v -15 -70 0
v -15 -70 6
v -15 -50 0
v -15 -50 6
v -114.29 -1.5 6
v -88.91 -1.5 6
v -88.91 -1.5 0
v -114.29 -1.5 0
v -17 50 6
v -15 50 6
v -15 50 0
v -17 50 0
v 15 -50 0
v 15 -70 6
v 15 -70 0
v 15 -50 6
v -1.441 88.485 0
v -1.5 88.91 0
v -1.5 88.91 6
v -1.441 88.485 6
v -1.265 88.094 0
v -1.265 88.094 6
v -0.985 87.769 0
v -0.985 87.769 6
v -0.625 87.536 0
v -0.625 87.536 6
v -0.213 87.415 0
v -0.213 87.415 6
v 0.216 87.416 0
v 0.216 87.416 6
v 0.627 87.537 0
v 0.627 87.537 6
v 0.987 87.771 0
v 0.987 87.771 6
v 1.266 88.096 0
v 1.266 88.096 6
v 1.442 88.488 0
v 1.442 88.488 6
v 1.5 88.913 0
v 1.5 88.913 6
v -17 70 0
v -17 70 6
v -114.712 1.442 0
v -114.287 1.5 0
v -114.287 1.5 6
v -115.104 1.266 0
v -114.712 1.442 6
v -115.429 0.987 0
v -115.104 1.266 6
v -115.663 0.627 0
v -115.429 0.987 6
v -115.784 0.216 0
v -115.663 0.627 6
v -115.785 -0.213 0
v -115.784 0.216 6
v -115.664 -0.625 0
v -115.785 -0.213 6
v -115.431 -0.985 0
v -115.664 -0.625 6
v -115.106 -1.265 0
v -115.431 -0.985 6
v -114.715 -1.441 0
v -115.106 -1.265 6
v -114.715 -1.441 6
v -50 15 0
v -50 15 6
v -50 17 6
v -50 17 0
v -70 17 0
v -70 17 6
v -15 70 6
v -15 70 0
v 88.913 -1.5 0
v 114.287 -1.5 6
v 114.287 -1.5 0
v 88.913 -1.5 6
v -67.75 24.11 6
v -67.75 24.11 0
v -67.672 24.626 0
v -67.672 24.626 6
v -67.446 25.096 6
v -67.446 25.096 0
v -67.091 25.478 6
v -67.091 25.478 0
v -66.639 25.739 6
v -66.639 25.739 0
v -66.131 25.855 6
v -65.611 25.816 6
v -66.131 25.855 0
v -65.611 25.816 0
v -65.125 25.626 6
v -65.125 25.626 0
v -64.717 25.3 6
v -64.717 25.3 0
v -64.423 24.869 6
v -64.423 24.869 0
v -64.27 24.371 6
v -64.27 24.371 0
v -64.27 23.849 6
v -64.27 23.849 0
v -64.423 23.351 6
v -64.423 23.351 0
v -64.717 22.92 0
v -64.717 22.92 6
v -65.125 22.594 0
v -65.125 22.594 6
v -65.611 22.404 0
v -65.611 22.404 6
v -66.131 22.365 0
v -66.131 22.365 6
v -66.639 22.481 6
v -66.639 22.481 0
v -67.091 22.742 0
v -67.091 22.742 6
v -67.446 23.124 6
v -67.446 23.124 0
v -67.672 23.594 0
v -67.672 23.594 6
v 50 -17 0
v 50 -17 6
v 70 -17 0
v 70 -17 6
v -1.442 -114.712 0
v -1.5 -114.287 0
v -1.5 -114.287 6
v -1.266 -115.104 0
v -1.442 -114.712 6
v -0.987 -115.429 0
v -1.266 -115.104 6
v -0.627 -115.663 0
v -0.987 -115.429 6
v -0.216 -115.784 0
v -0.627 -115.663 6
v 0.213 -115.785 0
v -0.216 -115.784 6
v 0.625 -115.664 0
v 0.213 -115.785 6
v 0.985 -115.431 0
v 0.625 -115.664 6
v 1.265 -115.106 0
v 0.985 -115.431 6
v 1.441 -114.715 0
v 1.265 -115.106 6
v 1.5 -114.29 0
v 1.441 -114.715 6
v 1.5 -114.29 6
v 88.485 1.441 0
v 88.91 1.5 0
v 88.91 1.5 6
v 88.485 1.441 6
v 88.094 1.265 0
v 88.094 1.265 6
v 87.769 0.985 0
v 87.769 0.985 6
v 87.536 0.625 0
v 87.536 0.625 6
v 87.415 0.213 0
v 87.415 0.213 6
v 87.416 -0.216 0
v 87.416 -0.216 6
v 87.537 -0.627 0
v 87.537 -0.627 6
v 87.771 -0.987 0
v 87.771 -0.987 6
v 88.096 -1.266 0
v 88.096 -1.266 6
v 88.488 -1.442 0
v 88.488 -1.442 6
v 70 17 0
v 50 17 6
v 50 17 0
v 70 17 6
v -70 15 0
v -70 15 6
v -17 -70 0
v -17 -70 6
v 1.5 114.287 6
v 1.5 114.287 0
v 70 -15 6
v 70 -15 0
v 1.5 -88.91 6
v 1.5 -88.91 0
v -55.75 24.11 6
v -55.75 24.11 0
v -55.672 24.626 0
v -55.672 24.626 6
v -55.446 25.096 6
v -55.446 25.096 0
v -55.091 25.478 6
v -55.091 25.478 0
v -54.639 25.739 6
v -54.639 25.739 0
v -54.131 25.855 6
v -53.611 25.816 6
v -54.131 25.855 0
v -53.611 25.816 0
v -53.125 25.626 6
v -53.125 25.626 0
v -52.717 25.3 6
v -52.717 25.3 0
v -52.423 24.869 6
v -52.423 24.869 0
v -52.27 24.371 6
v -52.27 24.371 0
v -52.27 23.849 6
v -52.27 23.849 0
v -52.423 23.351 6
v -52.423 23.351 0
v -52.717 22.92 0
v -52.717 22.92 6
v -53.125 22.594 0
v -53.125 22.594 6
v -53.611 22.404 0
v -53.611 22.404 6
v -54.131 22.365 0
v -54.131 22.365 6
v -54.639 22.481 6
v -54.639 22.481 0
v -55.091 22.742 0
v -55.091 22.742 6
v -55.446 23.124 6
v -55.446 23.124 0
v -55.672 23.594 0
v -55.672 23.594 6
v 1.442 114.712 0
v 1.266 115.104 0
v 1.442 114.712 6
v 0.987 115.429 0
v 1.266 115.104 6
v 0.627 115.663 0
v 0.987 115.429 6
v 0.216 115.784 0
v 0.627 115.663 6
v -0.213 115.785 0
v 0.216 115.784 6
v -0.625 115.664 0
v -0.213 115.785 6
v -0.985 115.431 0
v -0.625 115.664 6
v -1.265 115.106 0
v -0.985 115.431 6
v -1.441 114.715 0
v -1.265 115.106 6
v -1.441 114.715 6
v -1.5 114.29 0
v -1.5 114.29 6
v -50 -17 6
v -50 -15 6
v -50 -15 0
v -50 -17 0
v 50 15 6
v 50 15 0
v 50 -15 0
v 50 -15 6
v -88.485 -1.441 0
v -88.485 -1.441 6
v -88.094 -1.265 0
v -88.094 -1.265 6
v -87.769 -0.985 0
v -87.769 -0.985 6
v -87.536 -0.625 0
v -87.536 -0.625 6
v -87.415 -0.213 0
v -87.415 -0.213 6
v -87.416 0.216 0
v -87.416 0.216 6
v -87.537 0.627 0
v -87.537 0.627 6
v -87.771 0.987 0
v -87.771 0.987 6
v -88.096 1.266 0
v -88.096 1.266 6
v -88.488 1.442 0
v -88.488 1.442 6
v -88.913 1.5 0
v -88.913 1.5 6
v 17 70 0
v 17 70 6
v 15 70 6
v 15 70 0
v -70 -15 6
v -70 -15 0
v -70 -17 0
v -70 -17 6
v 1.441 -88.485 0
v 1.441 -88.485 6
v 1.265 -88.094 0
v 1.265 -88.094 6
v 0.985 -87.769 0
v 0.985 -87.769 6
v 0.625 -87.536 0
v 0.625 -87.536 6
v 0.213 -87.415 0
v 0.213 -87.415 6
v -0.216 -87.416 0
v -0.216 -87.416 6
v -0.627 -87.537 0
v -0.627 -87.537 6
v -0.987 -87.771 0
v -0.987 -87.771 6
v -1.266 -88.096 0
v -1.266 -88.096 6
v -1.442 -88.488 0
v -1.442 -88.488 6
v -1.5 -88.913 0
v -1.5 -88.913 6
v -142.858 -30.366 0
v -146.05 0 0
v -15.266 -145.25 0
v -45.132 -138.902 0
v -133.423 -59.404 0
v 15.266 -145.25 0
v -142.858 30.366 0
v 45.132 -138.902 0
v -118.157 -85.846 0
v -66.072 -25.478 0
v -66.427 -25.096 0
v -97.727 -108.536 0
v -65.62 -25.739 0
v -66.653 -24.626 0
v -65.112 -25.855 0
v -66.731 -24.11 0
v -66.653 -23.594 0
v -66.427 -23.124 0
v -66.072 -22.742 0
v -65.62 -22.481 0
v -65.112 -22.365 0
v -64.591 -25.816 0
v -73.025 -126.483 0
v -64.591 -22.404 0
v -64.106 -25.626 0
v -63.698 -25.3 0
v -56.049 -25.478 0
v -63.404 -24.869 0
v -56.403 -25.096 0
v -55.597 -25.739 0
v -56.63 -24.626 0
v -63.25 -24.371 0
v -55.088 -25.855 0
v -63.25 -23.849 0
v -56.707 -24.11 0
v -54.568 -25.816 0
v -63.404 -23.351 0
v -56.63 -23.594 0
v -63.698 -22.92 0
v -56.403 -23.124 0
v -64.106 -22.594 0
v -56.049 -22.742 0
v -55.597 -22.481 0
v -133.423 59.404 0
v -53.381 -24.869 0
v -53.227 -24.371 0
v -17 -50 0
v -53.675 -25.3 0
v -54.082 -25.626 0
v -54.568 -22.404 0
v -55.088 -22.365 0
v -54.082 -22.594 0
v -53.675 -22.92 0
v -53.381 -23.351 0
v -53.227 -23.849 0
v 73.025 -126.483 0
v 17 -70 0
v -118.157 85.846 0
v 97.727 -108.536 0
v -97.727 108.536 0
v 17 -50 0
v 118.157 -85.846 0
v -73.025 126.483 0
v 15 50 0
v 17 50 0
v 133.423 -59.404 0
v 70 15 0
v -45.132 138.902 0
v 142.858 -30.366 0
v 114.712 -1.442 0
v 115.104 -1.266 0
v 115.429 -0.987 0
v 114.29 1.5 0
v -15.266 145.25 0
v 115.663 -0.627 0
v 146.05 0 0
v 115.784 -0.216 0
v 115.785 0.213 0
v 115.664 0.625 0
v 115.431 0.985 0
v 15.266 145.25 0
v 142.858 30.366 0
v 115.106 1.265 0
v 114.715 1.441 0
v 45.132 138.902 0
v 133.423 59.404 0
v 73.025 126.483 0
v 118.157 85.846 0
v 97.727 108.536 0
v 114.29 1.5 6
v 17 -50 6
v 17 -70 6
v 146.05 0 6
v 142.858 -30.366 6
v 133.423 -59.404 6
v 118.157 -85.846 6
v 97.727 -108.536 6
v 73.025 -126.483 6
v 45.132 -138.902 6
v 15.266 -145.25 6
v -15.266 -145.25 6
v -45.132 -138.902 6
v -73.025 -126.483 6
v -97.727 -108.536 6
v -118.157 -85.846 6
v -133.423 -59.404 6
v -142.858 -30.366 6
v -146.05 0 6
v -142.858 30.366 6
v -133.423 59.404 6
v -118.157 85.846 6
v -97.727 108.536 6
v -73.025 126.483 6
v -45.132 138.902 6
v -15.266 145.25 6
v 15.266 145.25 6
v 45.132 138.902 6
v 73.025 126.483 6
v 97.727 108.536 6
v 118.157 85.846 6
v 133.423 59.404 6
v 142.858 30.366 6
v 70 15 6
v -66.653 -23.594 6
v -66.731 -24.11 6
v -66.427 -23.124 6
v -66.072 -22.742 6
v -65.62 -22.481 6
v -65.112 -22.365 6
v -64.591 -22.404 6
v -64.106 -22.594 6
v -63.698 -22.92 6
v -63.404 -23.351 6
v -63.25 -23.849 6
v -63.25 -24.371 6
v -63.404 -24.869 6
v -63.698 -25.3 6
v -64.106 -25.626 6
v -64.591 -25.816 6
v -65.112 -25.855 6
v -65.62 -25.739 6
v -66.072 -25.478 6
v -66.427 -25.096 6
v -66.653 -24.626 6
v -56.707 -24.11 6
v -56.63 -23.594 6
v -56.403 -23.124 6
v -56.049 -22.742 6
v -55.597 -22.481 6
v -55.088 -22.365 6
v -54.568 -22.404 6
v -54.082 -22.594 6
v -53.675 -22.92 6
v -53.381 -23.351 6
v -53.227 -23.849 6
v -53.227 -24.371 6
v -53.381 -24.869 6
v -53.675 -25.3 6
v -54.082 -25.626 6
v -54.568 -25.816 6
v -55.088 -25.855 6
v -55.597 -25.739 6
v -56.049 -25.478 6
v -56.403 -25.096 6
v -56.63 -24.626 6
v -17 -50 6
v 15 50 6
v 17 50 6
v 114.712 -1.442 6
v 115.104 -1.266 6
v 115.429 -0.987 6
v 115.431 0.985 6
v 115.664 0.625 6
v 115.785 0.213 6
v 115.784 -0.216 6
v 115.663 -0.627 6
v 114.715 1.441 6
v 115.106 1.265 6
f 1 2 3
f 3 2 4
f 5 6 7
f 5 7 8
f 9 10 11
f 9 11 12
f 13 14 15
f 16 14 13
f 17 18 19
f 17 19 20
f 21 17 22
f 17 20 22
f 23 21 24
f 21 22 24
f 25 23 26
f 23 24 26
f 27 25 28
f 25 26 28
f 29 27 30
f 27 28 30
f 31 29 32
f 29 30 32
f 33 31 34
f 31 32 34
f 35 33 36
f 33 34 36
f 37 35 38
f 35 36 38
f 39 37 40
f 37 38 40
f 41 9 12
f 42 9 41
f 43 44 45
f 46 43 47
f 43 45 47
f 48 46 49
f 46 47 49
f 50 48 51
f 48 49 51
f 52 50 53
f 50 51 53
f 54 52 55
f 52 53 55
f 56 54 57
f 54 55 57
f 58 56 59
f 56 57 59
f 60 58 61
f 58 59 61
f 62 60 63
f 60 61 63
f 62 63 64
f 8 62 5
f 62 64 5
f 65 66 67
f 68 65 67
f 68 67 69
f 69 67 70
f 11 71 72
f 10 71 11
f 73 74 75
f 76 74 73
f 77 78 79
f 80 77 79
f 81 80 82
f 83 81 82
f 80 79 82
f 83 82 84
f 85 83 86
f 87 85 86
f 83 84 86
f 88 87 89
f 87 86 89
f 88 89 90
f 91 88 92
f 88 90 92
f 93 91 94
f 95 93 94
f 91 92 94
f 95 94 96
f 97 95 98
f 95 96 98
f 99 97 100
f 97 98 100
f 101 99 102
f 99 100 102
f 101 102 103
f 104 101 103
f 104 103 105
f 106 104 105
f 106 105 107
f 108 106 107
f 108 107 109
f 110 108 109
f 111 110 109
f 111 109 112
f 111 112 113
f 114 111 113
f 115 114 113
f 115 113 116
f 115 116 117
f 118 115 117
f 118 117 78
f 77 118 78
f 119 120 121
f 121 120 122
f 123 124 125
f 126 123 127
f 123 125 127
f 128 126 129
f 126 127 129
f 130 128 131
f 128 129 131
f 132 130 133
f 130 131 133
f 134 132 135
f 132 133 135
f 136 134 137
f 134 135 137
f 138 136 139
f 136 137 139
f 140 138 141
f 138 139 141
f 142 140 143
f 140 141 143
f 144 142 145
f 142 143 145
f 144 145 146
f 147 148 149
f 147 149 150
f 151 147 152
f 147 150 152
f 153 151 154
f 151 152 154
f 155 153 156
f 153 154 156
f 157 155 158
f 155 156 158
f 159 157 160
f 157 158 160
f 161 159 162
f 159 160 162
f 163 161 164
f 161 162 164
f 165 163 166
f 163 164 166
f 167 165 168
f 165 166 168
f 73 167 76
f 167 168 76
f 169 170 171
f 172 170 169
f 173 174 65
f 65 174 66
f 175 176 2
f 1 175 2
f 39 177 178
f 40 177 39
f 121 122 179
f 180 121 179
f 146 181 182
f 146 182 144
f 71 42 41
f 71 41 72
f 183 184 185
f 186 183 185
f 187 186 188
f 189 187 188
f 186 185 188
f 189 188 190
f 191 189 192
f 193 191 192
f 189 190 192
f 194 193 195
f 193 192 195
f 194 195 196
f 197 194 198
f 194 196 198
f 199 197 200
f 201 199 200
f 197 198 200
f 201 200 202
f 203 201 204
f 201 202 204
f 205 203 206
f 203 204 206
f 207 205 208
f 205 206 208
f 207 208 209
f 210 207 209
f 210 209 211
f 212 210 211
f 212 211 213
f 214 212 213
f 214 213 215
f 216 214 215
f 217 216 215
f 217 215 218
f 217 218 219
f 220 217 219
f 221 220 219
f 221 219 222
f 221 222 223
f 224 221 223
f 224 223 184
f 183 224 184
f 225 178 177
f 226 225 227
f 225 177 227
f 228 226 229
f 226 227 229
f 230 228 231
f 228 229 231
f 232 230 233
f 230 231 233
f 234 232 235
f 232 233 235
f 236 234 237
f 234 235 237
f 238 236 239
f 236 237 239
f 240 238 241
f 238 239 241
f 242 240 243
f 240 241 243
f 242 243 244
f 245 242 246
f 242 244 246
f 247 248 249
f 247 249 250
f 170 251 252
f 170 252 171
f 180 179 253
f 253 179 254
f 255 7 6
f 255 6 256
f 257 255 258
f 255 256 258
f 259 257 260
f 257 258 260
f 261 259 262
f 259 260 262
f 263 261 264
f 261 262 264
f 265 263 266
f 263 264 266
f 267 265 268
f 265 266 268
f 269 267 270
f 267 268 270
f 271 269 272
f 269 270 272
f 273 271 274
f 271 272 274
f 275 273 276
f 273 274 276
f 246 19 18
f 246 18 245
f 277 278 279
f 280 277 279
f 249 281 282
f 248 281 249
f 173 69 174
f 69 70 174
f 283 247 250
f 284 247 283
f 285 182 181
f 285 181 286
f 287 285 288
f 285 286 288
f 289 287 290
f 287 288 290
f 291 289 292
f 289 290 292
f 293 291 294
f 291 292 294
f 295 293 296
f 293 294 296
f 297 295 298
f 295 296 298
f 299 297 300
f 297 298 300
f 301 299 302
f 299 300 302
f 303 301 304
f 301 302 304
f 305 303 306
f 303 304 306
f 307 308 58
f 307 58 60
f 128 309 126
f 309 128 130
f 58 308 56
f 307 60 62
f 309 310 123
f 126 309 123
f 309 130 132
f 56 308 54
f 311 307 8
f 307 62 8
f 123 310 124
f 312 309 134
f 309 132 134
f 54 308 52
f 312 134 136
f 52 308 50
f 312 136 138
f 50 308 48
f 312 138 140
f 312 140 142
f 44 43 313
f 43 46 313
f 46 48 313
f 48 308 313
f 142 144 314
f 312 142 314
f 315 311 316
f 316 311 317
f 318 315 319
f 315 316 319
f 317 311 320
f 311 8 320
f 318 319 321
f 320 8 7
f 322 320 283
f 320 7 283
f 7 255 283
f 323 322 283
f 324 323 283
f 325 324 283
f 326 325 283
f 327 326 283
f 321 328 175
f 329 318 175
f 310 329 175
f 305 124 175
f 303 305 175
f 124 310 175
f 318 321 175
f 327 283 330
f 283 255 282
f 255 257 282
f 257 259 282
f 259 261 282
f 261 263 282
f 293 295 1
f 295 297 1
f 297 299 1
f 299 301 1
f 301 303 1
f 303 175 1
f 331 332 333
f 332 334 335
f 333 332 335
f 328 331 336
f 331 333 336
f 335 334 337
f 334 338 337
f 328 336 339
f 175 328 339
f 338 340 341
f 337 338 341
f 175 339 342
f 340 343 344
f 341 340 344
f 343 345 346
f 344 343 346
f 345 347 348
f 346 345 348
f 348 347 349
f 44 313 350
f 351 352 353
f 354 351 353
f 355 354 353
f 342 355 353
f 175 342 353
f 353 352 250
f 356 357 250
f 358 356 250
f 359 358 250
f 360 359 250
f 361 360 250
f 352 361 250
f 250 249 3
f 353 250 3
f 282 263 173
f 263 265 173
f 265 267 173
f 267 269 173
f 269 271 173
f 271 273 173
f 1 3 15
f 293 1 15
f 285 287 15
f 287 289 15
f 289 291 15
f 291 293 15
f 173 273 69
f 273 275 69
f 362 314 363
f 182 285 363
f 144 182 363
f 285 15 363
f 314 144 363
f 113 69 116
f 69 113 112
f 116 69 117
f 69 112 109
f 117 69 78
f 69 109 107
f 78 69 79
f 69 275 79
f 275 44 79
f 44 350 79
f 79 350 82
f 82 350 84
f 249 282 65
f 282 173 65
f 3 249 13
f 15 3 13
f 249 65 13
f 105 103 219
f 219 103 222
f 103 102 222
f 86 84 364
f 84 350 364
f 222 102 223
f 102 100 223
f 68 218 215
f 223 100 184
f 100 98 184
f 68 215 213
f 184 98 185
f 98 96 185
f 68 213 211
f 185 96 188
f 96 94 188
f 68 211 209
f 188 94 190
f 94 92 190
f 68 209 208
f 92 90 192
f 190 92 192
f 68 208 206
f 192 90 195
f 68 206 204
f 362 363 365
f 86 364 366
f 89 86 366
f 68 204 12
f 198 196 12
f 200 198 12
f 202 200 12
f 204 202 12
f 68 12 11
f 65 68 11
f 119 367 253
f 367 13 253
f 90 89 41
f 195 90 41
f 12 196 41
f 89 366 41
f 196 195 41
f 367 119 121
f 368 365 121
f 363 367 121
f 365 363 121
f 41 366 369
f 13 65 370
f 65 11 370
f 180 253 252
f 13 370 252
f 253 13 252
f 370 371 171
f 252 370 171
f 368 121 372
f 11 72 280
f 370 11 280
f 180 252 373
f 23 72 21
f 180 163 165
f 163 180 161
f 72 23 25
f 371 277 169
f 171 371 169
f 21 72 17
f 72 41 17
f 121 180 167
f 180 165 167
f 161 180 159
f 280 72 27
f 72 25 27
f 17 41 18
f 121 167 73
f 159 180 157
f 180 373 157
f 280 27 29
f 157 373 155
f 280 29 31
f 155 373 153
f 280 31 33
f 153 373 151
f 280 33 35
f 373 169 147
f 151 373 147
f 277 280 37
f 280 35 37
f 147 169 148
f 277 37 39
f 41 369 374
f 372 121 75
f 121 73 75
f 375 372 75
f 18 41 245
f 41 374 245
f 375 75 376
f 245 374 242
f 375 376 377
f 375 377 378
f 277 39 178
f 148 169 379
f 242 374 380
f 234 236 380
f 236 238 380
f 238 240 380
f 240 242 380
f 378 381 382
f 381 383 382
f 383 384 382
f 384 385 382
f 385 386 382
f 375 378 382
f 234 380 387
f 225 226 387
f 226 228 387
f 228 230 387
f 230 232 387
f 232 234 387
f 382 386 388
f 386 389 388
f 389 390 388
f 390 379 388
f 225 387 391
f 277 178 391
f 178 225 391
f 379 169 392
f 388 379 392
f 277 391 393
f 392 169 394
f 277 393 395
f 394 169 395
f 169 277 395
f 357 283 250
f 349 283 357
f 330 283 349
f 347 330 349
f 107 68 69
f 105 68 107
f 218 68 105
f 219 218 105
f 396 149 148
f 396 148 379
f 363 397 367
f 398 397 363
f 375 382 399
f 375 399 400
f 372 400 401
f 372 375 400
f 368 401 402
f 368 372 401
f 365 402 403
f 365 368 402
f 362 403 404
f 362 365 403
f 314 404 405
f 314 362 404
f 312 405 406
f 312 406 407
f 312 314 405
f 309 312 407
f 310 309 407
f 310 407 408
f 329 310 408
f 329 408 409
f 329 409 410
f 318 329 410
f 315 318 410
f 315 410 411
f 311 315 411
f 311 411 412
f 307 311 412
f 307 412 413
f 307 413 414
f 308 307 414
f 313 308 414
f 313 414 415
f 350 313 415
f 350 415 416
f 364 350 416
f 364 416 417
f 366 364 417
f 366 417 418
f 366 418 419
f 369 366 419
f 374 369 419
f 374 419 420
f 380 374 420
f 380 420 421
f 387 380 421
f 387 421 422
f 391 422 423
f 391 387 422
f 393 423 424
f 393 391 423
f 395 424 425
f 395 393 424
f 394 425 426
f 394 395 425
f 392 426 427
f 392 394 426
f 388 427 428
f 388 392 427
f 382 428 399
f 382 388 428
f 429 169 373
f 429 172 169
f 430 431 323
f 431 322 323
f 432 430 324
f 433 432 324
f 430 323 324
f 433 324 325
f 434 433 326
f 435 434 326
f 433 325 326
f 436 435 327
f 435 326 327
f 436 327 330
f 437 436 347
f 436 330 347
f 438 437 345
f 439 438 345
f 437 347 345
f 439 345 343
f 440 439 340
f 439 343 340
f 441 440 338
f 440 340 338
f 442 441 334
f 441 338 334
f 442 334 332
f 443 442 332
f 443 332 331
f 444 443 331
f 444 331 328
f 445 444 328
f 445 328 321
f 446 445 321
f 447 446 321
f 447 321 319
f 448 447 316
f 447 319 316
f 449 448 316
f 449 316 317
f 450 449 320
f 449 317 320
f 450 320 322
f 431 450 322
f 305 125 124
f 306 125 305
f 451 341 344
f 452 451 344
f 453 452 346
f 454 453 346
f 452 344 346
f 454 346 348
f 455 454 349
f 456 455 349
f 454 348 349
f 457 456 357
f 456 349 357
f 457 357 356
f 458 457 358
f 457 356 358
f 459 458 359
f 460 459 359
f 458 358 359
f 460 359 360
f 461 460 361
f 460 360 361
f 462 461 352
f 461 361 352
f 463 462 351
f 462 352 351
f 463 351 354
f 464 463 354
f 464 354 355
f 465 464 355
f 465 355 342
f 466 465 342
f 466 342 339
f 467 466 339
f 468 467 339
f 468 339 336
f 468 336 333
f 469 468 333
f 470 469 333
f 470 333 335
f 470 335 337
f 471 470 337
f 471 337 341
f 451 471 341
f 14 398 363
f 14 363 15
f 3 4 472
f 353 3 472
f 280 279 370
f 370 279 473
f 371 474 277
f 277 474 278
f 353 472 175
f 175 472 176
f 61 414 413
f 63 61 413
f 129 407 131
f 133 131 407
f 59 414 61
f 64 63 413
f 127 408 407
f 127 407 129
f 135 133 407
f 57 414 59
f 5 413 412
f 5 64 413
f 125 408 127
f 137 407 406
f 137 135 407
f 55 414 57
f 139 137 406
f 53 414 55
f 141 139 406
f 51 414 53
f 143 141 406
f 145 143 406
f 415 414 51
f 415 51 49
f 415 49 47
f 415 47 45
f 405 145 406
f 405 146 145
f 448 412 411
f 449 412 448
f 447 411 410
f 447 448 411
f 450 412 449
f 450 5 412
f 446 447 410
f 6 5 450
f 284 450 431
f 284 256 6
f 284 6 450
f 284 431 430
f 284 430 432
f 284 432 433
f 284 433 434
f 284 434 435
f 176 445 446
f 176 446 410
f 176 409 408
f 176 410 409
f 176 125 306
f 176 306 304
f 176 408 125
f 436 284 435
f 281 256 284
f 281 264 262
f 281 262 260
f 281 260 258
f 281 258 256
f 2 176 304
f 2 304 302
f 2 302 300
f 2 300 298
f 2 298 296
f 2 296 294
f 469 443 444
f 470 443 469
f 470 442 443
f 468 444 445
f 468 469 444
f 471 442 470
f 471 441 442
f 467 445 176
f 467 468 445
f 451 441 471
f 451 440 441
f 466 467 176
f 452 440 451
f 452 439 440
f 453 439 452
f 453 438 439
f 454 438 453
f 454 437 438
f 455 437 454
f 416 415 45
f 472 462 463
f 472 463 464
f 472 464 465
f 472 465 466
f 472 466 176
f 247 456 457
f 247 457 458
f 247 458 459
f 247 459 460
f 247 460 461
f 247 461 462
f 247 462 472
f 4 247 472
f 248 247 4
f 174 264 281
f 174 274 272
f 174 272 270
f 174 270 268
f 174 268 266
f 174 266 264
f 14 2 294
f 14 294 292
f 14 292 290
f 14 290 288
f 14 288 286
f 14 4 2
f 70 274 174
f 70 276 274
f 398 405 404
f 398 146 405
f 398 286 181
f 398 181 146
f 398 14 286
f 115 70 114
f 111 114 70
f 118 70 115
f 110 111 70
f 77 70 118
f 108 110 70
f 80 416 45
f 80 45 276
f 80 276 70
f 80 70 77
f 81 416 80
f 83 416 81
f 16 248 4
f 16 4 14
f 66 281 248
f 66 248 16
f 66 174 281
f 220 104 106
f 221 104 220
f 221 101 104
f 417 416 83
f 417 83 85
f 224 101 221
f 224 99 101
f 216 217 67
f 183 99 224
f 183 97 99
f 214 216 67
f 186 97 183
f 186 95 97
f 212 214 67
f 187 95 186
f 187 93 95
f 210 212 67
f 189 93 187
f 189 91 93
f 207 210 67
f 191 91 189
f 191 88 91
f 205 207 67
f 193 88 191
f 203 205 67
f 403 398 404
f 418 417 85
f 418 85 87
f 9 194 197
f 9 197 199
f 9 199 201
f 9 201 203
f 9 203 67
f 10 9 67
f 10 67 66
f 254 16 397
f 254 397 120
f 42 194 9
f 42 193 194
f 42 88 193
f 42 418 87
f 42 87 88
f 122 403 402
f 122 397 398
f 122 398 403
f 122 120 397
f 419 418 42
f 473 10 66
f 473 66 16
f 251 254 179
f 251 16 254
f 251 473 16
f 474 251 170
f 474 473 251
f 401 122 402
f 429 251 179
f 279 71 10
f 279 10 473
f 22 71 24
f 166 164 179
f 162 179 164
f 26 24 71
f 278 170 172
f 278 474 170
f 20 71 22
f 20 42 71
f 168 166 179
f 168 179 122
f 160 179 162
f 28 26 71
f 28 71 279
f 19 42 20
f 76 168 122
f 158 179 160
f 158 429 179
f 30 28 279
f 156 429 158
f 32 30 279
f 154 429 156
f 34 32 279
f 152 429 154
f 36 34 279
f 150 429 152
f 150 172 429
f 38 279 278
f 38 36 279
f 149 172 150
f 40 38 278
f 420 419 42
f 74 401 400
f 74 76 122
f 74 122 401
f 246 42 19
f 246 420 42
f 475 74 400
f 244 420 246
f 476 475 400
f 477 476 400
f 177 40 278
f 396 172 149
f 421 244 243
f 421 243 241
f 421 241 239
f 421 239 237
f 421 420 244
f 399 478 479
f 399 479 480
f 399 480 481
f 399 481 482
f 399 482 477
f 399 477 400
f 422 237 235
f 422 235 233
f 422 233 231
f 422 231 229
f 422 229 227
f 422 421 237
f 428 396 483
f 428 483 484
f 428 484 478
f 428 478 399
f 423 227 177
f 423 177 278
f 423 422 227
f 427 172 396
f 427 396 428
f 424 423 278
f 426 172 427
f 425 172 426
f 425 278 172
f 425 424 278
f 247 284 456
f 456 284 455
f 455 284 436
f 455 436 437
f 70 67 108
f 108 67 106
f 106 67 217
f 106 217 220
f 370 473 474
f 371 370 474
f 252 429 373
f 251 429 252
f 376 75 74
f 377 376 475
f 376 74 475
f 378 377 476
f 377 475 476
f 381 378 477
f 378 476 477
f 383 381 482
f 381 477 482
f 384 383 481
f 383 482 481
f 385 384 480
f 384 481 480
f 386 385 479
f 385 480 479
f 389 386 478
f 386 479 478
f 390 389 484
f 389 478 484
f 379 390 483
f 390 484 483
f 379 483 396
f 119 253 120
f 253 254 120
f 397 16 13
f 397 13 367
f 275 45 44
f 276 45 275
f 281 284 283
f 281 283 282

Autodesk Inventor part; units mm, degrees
ref_plane "YZ Plane" through (0, 0, 0) normal (1, 0, 0) x (0, 1, 0)
ref_plane "XZ Plane" through (0, 0, 0) normal (0, 1, 0) x (-1, 0, 0)
ref_plane "XY Plane" through (0, 0, 0) normal (0, 0, 1) x (1, 0, 0)
sketch "Sketch1" plane through (0, 0, 0) normal (0, 0, 1) x (1, 0, 0)
  line L0 (-204.47, 0) -> (204.47, 0) projected
  line L1 (0, -204.47) -> (0, 204.47) projected
  circle A0 centre (0, 0) radius 146.05
  dimension "d0" = 292.1
extrude "Extrusion1" add sketch "Sketch1" along normal blind 6
sketch "Sketch2" plane through (0, 0, 6) normal (0, 0, 1) x (1, 0, 0)
  circle A0 centre (0, 0) radius 114.3 construction
  arc A1 (-1.4999, 88.8873) -> (1.4999, 88.8873) centre (0, 0) ccw construction
  line L0 (-204.47, 0) -> (204.47, 0) construction
  line L1 (0, -204.47) -> (0, 204.47) construction
  arc A2 (1.4999, 114.2873) -> (-1.5, 114.2902) centre (0, 114.3) ccw
  arc A3 (-1.5, 88.9098) -> (1.4999, 88.9127) centre (0, 88.9) ccw
  line L2 (1.4999, 114.2902) -> (1.4999, 88.8873)
  line L3 (-1.5, 88.8873) -> (-1.5, 114.2902)
  arc A4 (-114.2873, 1.4999) -> (-114.2902, -1.5) centre (-114.3, 0) ccw
  arc A5 (-88.9098, -1.5) -> (-88.9127, 1.4999) centre (-88.9, 0) ccw
  line L4 (-114.2902, 1.4999) -> (-88.8873, 1.4999)
  line L5 (-88.8873, -1.5) -> (-114.2902, -1.5)
  arc A6 (-1.4999, -114.2873) -> (1.5, -114.2902) centre (0, -114.3) ccw
  arc A7 (1.5, -88.9098) -> (-1.4999, -88.9127) centre (0, -88.9) ccw
  line L6 (-1.4999, -114.2902) -> (-1.4999, -88.8873)
  line L7 (1.5, -88.8873) -> (1.5, -114.2902)
  arc A8 (88.9098, 1.5) -> (88.9127, -1.4999) centre (88.9, 0) ccw
  line L8 (88.8873, 1.5) -> (114.2902, 1.5)
  arc A9 (114.2873, -1.4999) -> (114.2902, 1.5) centre (114.3, 0) ccw
  line L9 (114.2902, -1.4999) -> (88.8873, -1.4999)
  point P0 (-88.8873, -1.4999)
  point P1 (1.4999, -88.8873)
  point P2 (88.8873, 1.4999)
  dimension "d3" = 228.6
  dimension "d4" = 177.8
  dimension "d5" = 3
  dimension "d6" = 3
  dimension "d13" = 3
  dimension "d14" = 3
  dimension "d15" = 3
  dimension "d16" = 3
  dimension "d17" = 3
  dimension "d18" = 3
extrude "Extrusion2" cut sketch "Sketch2" against normal blind 6
sketch "Sketch4" plane through (0, 0, 6) normal (0, 0, 1) x (1, 0, 0)
  line L0 (-204.47, 0) -> (204.47, 0) projected
  line L1 (0, -204.47) -> (0, 204.47) projected
  line L2 (-17, 70) -> (-15, 70)
  line L3 (-15, 70) -> (-15, 50)
  line L4 (-15, 50) -> (-17, 50)
  line L5 (-17, 50) -> (-17, 70)
  line L6 (17, 70) -> (15, 70)
  line L7 (15, 70) -> (15, 50)
  line L8 (15, 50) -> (17, 50)
  line L9 (17, 50) -> (17, 70)
  line L10 (-17, -70) -> (-15, -70)
  line L11 (-15, -70) -> (-15, -50)
  line L12 (-15, -50) -> (-17, -50)
  line L13 (-17, -50) -> (-17, -70)
  line L14 (17, -70) -> (15, -70)
  line L15 (15, -70) -> (15, -50)
  line L16 (15, -50) -> (17, -50)
  line L17 (17, -50) -> (17, -70)
  line L18 (-70, -17) -> (-70, -15)
  line L19 (-70, -15) -> (-50, -15)
  line L20 (-50, -15) -> (-50, -17)
  line L21 (-50, -17) -> (-70, -17)
  line L22 (-70, 17) -> (-70, 15)
  line L23 (-70, 15) -> (-50, 15)
  line L24 (-50, 15) -> (-50, 17)
  line L25 (-50, 17) -> (-70, 17)
  line L26 (70, -17) -> (70, -15)
  line L27 (70, -15) -> (50, -15)
  line L28 (50, -15) -> (50, -17)
  line L29 (50, -17) -> (70, -17)
  line L30 (70, 17) -> (70, 15)
  line L31 (70, 15) -> (50, 15)
  line L32 (50, 15) -> (50, 17)
  line L33 (50, 17) -> (70, 17)
  point P0 (0, 0)
  dimension "d21" = 2
  dimension "d22" = 50
  dimension "d23" = 20
  dimension "d24" = 15
  dimension "d25" = 2
  dimension "d26" = 20
extrude "Extrusion3" cut sketch "Sketch4" against normal blind 6
sketch "Sketch5" plane through (0, 0, 0) normal (0, 0, -1) x (-1, 0, 0)
  circle A0 centre (66, 24.11) radius 1.75
  circle A1 centre (54, 24.11) radius 1.75
  circle A2 centre (54.9574, -24.11) radius 1.75
  circle A3 centre (64.9809, -24.11) radius 1.75
  point P0 (0, 0)
extrude "Extrusion4" cut sketch "Sketch5" against normal blind 10
properties part number "BallBallerina_BasePlate_v1"
